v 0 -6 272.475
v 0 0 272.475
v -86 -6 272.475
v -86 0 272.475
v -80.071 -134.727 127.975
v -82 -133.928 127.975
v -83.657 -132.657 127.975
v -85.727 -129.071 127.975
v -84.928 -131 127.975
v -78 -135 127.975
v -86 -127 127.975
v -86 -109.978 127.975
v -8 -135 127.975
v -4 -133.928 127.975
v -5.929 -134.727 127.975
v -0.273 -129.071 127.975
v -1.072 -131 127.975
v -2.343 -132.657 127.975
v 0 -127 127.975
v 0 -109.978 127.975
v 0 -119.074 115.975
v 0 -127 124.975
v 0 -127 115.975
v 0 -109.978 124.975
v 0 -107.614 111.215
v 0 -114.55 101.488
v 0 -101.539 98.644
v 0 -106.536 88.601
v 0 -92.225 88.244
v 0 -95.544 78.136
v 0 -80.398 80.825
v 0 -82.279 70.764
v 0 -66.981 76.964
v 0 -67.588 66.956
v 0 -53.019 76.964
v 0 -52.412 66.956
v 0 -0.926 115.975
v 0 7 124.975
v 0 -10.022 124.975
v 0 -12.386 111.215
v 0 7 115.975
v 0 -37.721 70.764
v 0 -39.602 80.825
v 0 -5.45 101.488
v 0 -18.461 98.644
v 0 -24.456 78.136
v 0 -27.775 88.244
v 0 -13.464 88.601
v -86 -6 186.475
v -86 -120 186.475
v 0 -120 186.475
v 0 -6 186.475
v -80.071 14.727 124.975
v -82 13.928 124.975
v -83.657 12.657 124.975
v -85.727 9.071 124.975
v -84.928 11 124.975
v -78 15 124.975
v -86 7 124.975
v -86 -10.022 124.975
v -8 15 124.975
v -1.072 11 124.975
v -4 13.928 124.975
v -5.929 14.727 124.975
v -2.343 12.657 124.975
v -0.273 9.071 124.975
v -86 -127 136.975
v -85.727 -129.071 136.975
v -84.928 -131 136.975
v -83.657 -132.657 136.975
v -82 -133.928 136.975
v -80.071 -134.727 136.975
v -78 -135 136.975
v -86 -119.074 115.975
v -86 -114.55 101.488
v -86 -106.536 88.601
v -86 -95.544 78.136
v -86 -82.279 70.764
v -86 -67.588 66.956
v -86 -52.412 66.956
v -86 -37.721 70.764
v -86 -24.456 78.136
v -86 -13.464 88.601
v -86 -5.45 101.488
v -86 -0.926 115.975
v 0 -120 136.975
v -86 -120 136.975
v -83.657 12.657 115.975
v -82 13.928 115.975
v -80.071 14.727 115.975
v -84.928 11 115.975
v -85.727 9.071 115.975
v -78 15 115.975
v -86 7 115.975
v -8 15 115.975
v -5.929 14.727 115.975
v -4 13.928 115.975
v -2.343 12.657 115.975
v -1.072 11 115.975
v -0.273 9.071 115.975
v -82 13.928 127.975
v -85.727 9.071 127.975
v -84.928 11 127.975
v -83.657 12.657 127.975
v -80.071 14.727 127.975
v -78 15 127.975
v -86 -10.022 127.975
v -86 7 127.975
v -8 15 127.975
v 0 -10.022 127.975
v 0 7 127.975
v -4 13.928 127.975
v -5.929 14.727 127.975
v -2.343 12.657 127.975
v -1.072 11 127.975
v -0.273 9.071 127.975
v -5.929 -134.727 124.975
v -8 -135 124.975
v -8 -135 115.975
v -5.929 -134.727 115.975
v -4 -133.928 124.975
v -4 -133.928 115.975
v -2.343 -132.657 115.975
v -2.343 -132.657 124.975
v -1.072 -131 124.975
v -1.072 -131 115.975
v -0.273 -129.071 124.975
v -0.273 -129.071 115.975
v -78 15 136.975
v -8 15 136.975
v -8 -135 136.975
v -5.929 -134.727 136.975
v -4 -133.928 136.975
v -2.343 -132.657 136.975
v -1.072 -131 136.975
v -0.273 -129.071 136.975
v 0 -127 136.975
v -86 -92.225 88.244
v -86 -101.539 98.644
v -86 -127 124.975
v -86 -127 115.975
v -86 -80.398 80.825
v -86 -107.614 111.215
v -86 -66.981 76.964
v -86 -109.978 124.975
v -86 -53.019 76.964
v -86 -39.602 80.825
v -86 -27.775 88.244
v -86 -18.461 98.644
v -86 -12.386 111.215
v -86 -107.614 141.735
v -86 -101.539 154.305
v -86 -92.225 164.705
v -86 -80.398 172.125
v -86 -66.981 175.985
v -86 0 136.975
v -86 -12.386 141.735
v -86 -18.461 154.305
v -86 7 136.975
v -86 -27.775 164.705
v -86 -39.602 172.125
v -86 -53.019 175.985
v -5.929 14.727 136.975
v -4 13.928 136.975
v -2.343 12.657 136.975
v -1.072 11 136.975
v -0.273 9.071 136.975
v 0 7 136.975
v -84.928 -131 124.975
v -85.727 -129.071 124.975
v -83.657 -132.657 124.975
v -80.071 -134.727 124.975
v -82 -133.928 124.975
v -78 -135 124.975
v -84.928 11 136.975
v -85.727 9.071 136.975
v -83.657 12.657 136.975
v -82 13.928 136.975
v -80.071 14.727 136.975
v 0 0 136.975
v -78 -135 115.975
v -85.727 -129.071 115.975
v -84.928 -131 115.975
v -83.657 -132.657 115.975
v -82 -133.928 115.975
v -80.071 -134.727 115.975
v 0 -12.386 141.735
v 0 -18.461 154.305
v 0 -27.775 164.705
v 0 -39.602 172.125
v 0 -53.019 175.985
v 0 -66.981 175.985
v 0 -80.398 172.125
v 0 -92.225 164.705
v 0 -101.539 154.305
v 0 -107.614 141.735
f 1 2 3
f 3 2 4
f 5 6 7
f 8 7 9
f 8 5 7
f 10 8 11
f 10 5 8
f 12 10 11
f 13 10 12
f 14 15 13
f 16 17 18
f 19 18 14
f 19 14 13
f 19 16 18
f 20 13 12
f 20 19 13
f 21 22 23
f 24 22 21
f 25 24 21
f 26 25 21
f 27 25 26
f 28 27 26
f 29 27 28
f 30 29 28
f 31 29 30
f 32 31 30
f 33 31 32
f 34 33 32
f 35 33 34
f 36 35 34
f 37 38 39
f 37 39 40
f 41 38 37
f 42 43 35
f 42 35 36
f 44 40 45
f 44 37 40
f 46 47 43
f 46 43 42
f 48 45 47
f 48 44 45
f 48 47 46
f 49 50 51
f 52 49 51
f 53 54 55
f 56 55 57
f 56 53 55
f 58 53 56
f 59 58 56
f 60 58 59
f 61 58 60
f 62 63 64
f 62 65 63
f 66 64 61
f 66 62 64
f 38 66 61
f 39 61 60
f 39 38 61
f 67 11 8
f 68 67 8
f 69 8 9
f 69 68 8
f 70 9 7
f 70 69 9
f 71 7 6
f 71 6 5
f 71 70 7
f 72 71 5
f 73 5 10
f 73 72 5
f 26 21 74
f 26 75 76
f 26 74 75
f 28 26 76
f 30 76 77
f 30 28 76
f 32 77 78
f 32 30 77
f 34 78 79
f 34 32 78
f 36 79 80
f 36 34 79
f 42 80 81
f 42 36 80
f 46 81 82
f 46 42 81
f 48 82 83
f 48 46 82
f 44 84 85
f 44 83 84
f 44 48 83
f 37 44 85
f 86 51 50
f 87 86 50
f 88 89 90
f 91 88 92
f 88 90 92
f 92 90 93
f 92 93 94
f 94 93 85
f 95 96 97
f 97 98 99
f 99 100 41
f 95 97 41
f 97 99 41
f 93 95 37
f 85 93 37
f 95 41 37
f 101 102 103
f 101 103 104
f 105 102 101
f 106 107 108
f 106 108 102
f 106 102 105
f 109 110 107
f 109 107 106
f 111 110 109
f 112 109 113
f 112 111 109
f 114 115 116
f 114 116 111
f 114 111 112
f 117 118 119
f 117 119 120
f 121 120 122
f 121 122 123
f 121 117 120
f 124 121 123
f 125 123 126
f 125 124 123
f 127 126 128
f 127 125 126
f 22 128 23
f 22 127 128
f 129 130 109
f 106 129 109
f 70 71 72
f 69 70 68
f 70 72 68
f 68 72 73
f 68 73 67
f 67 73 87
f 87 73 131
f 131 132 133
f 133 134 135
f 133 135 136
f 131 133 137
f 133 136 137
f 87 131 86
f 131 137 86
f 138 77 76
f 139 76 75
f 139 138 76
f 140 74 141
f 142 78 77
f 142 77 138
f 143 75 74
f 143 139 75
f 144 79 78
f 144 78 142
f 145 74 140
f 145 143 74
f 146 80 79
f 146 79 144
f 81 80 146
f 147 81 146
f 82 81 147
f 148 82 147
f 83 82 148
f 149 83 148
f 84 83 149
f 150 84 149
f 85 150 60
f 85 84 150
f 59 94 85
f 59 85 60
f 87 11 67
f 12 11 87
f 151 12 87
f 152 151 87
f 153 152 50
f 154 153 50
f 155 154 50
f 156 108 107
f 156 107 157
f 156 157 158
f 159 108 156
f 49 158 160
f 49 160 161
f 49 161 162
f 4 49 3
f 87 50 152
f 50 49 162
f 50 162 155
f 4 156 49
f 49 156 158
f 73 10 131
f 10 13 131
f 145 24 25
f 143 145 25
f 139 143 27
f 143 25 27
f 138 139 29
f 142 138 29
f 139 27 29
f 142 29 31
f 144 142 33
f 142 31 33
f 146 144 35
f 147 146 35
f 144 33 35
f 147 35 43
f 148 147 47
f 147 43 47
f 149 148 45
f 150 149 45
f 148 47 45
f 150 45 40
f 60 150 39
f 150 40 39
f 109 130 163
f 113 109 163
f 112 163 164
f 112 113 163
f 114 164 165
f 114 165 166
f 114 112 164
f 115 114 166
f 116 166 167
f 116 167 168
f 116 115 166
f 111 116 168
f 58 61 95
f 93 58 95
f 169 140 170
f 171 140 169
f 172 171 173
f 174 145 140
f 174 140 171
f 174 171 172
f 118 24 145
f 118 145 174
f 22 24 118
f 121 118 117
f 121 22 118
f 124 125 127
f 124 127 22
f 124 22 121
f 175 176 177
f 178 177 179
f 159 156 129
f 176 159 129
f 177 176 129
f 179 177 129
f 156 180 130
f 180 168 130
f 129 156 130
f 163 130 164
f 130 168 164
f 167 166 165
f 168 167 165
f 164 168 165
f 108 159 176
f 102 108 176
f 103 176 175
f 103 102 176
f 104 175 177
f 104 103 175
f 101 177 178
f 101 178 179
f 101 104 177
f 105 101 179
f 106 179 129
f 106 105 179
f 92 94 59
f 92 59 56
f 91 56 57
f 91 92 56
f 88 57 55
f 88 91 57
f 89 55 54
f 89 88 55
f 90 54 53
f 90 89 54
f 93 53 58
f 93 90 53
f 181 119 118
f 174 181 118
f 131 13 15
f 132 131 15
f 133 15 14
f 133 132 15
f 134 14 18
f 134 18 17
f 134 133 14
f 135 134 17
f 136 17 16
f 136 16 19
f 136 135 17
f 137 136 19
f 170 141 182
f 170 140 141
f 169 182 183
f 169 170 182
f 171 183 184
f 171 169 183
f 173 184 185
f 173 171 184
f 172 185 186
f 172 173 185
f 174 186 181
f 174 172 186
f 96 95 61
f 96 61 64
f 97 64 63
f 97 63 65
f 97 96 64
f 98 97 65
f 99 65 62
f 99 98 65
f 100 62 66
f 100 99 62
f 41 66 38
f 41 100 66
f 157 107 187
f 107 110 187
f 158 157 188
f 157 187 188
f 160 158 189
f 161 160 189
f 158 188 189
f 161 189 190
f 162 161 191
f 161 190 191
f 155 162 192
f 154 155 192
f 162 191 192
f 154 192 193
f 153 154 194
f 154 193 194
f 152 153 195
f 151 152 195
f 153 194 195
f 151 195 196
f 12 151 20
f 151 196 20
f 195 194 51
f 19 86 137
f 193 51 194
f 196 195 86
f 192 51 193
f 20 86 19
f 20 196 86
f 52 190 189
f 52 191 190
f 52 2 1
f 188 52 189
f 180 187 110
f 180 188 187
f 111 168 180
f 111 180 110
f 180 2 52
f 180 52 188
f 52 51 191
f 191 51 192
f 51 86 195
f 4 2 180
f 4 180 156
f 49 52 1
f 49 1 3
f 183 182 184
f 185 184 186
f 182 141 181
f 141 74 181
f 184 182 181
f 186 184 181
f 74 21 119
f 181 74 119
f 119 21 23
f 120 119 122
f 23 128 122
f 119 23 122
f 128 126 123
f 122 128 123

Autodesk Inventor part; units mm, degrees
ref_plane "YZ Plane" through (0, 0, 0) normal (1, 0, 0) x (0, 1, 0)
ref_plane "XZ Plane" through (0, 0, 0) normal (0, 1, 0) x (-1, 0, 0)
ref_plane "XY Plane" through (0, 0, 0) normal (0, 0, 1) x (1, 0, 0)
sketch "Szkic1" plane through (0, 0, 0) normal (0, 1, 0) x (-1, 0, 0)
  line L0 (0, 272.4746) -> (86, 272.4746)
  line L1 (86, 272.4746) -> (86, 186.4746)
  line L2 (86, 186.4746) -> (0, 186.4746)
  line L3 (0, 186.4746) -> (0, 272.4746)
  line L4 (0, 186.4746) -> (0, 180.4746)
  line L5 (0, 180.4746) -> (86, 180.4746)
  line L6 (86, 180.4746) -> (86, 186.4746)
  line L7 (0, 180.4746) -> (0, 66.4746)
  line L8 (0, 66.4746) -> (86, 66.4746)
  line L9 (86, 66.4746) -> (86, 180.4746)
  point P0 (0, 0)
  dimension "d0" = 86
  dimension "d1" = 86
  dimension "d2" = 6
  dimension "d3" = 114
  dimension "d4" = 86
extrude "Wyciągnięcie proste1" add sketch "Szkic1" against normal blind 6 contours L0 L1 L2 L3
extrude "Wyciągnięcie proste2" add sketch "Szkic1" against normal blind 120 contours L2 L6 L5 L4
extrude "Wyciągnięcie proste3" add sketch "Szkic1" against normal blind 120 contours L5 L9 L8 L7
sketch "Szkic3" plane through (0, -120, 186.4746) normal (1, 0, 0) x (0, 0, -1)
  line L0 (49.5, 135) -> (70.5, 135)
  line L1 (49.5, 135) -> (70.5, -15) construction
  line L2 (70.5, 135) -> (49.5, -15) construction
  line L3 (0, 0) -> (120, 0) projected
  line L4 (120, 120) -> (120, 0)
  line L5 (120, 0) -> (0, 0)
  line L6 (0, 0) -> (0, 120)
  line L7 (0, 120) -> (120, 0) construction
  line L8 (120, 120) -> (0, 0) construction
  line L9 (49.5, -15) -> (49.5, 0)
  line L10 (49.5, 120) -> (49.5, 135)
  line L11 (70.5, 135) -> (70.5, 119.0741)
  line L12 (70.5, 0.9259) -> (70.5, -15)
  arc A0 (70.5, 0.9259) -> (70.5, 119.0741) centre (60, 60) ccw
  line L13 (58.5, 135) -> (61.5, 135)
  line L14 (61.5, -15) -> (58.5, 135) construction
  line L15 (58.5, -15) -> (61.5, 135) construction
  line L16 (70.5, -15) -> (61.5, -15)
  line L17 (58.5, -15) -> (49.5, -15)
  line L18 (58.5, -15) -> (58.5, 10.0225)
  line L19 (61.5, 10.0225) -> (61.5, -15)
  line L20 (61.5, 135) -> (61.5, 109.9775)
  line L21 (58.5, 109.9775) -> (58.5, 135)
  arc A1 (61.5, 10.0225) -> (61.5, 109.9775) centre (60, 60) ccw
  arc A2 (58.5, 109.9775) -> (58.5, 10.0225) centre (60, 60) ccw
  line L22 (0, 120) -> (58.5, 120)
  line L23 (61.5, 120) -> (120, 120)
  line L24 (58.5, -15) -> (61.5, -15)
  point P0 (186.4746, 120)
  point P1 (70.5, 0)
  point P2 (61.5, 0)
  point P3 (58.5, 0)
  point P4 (49.5, 0)
  point P5 (70.5, 120)
  point P6 (120, 60)
extrude "Wyciągnięcie proste4" add sketch "Szkic3" against normal blind 86 contours L0 L21 L22 L10 | L0 L11 L23 L20 | L3 L18 L17 L9 | L3 L12 L16 L19
extrude "Wyciągnięcie proste5" cut sketch "Szkic3" against normal blind 86 contours L0 L20 A1 L19 L3 L18 A2 L21 | L23 L4 A0 L11 | L3 L19 L24 L18 | L4 L3 L12 A0
fillet "Zaokrąglenie1" radius 8 8 edges at (-86, 15, 120.4746) (-86, 15, 132.4746) (0, 15, 120.4746) (0, 15, 132.4746) (-86, -135, 120.4746) (-86, -135, 132.4746) (0, -135, 120.4746) (0, -135, 132.4746)
properties part number "mocowanie_silnika_członu_3"
